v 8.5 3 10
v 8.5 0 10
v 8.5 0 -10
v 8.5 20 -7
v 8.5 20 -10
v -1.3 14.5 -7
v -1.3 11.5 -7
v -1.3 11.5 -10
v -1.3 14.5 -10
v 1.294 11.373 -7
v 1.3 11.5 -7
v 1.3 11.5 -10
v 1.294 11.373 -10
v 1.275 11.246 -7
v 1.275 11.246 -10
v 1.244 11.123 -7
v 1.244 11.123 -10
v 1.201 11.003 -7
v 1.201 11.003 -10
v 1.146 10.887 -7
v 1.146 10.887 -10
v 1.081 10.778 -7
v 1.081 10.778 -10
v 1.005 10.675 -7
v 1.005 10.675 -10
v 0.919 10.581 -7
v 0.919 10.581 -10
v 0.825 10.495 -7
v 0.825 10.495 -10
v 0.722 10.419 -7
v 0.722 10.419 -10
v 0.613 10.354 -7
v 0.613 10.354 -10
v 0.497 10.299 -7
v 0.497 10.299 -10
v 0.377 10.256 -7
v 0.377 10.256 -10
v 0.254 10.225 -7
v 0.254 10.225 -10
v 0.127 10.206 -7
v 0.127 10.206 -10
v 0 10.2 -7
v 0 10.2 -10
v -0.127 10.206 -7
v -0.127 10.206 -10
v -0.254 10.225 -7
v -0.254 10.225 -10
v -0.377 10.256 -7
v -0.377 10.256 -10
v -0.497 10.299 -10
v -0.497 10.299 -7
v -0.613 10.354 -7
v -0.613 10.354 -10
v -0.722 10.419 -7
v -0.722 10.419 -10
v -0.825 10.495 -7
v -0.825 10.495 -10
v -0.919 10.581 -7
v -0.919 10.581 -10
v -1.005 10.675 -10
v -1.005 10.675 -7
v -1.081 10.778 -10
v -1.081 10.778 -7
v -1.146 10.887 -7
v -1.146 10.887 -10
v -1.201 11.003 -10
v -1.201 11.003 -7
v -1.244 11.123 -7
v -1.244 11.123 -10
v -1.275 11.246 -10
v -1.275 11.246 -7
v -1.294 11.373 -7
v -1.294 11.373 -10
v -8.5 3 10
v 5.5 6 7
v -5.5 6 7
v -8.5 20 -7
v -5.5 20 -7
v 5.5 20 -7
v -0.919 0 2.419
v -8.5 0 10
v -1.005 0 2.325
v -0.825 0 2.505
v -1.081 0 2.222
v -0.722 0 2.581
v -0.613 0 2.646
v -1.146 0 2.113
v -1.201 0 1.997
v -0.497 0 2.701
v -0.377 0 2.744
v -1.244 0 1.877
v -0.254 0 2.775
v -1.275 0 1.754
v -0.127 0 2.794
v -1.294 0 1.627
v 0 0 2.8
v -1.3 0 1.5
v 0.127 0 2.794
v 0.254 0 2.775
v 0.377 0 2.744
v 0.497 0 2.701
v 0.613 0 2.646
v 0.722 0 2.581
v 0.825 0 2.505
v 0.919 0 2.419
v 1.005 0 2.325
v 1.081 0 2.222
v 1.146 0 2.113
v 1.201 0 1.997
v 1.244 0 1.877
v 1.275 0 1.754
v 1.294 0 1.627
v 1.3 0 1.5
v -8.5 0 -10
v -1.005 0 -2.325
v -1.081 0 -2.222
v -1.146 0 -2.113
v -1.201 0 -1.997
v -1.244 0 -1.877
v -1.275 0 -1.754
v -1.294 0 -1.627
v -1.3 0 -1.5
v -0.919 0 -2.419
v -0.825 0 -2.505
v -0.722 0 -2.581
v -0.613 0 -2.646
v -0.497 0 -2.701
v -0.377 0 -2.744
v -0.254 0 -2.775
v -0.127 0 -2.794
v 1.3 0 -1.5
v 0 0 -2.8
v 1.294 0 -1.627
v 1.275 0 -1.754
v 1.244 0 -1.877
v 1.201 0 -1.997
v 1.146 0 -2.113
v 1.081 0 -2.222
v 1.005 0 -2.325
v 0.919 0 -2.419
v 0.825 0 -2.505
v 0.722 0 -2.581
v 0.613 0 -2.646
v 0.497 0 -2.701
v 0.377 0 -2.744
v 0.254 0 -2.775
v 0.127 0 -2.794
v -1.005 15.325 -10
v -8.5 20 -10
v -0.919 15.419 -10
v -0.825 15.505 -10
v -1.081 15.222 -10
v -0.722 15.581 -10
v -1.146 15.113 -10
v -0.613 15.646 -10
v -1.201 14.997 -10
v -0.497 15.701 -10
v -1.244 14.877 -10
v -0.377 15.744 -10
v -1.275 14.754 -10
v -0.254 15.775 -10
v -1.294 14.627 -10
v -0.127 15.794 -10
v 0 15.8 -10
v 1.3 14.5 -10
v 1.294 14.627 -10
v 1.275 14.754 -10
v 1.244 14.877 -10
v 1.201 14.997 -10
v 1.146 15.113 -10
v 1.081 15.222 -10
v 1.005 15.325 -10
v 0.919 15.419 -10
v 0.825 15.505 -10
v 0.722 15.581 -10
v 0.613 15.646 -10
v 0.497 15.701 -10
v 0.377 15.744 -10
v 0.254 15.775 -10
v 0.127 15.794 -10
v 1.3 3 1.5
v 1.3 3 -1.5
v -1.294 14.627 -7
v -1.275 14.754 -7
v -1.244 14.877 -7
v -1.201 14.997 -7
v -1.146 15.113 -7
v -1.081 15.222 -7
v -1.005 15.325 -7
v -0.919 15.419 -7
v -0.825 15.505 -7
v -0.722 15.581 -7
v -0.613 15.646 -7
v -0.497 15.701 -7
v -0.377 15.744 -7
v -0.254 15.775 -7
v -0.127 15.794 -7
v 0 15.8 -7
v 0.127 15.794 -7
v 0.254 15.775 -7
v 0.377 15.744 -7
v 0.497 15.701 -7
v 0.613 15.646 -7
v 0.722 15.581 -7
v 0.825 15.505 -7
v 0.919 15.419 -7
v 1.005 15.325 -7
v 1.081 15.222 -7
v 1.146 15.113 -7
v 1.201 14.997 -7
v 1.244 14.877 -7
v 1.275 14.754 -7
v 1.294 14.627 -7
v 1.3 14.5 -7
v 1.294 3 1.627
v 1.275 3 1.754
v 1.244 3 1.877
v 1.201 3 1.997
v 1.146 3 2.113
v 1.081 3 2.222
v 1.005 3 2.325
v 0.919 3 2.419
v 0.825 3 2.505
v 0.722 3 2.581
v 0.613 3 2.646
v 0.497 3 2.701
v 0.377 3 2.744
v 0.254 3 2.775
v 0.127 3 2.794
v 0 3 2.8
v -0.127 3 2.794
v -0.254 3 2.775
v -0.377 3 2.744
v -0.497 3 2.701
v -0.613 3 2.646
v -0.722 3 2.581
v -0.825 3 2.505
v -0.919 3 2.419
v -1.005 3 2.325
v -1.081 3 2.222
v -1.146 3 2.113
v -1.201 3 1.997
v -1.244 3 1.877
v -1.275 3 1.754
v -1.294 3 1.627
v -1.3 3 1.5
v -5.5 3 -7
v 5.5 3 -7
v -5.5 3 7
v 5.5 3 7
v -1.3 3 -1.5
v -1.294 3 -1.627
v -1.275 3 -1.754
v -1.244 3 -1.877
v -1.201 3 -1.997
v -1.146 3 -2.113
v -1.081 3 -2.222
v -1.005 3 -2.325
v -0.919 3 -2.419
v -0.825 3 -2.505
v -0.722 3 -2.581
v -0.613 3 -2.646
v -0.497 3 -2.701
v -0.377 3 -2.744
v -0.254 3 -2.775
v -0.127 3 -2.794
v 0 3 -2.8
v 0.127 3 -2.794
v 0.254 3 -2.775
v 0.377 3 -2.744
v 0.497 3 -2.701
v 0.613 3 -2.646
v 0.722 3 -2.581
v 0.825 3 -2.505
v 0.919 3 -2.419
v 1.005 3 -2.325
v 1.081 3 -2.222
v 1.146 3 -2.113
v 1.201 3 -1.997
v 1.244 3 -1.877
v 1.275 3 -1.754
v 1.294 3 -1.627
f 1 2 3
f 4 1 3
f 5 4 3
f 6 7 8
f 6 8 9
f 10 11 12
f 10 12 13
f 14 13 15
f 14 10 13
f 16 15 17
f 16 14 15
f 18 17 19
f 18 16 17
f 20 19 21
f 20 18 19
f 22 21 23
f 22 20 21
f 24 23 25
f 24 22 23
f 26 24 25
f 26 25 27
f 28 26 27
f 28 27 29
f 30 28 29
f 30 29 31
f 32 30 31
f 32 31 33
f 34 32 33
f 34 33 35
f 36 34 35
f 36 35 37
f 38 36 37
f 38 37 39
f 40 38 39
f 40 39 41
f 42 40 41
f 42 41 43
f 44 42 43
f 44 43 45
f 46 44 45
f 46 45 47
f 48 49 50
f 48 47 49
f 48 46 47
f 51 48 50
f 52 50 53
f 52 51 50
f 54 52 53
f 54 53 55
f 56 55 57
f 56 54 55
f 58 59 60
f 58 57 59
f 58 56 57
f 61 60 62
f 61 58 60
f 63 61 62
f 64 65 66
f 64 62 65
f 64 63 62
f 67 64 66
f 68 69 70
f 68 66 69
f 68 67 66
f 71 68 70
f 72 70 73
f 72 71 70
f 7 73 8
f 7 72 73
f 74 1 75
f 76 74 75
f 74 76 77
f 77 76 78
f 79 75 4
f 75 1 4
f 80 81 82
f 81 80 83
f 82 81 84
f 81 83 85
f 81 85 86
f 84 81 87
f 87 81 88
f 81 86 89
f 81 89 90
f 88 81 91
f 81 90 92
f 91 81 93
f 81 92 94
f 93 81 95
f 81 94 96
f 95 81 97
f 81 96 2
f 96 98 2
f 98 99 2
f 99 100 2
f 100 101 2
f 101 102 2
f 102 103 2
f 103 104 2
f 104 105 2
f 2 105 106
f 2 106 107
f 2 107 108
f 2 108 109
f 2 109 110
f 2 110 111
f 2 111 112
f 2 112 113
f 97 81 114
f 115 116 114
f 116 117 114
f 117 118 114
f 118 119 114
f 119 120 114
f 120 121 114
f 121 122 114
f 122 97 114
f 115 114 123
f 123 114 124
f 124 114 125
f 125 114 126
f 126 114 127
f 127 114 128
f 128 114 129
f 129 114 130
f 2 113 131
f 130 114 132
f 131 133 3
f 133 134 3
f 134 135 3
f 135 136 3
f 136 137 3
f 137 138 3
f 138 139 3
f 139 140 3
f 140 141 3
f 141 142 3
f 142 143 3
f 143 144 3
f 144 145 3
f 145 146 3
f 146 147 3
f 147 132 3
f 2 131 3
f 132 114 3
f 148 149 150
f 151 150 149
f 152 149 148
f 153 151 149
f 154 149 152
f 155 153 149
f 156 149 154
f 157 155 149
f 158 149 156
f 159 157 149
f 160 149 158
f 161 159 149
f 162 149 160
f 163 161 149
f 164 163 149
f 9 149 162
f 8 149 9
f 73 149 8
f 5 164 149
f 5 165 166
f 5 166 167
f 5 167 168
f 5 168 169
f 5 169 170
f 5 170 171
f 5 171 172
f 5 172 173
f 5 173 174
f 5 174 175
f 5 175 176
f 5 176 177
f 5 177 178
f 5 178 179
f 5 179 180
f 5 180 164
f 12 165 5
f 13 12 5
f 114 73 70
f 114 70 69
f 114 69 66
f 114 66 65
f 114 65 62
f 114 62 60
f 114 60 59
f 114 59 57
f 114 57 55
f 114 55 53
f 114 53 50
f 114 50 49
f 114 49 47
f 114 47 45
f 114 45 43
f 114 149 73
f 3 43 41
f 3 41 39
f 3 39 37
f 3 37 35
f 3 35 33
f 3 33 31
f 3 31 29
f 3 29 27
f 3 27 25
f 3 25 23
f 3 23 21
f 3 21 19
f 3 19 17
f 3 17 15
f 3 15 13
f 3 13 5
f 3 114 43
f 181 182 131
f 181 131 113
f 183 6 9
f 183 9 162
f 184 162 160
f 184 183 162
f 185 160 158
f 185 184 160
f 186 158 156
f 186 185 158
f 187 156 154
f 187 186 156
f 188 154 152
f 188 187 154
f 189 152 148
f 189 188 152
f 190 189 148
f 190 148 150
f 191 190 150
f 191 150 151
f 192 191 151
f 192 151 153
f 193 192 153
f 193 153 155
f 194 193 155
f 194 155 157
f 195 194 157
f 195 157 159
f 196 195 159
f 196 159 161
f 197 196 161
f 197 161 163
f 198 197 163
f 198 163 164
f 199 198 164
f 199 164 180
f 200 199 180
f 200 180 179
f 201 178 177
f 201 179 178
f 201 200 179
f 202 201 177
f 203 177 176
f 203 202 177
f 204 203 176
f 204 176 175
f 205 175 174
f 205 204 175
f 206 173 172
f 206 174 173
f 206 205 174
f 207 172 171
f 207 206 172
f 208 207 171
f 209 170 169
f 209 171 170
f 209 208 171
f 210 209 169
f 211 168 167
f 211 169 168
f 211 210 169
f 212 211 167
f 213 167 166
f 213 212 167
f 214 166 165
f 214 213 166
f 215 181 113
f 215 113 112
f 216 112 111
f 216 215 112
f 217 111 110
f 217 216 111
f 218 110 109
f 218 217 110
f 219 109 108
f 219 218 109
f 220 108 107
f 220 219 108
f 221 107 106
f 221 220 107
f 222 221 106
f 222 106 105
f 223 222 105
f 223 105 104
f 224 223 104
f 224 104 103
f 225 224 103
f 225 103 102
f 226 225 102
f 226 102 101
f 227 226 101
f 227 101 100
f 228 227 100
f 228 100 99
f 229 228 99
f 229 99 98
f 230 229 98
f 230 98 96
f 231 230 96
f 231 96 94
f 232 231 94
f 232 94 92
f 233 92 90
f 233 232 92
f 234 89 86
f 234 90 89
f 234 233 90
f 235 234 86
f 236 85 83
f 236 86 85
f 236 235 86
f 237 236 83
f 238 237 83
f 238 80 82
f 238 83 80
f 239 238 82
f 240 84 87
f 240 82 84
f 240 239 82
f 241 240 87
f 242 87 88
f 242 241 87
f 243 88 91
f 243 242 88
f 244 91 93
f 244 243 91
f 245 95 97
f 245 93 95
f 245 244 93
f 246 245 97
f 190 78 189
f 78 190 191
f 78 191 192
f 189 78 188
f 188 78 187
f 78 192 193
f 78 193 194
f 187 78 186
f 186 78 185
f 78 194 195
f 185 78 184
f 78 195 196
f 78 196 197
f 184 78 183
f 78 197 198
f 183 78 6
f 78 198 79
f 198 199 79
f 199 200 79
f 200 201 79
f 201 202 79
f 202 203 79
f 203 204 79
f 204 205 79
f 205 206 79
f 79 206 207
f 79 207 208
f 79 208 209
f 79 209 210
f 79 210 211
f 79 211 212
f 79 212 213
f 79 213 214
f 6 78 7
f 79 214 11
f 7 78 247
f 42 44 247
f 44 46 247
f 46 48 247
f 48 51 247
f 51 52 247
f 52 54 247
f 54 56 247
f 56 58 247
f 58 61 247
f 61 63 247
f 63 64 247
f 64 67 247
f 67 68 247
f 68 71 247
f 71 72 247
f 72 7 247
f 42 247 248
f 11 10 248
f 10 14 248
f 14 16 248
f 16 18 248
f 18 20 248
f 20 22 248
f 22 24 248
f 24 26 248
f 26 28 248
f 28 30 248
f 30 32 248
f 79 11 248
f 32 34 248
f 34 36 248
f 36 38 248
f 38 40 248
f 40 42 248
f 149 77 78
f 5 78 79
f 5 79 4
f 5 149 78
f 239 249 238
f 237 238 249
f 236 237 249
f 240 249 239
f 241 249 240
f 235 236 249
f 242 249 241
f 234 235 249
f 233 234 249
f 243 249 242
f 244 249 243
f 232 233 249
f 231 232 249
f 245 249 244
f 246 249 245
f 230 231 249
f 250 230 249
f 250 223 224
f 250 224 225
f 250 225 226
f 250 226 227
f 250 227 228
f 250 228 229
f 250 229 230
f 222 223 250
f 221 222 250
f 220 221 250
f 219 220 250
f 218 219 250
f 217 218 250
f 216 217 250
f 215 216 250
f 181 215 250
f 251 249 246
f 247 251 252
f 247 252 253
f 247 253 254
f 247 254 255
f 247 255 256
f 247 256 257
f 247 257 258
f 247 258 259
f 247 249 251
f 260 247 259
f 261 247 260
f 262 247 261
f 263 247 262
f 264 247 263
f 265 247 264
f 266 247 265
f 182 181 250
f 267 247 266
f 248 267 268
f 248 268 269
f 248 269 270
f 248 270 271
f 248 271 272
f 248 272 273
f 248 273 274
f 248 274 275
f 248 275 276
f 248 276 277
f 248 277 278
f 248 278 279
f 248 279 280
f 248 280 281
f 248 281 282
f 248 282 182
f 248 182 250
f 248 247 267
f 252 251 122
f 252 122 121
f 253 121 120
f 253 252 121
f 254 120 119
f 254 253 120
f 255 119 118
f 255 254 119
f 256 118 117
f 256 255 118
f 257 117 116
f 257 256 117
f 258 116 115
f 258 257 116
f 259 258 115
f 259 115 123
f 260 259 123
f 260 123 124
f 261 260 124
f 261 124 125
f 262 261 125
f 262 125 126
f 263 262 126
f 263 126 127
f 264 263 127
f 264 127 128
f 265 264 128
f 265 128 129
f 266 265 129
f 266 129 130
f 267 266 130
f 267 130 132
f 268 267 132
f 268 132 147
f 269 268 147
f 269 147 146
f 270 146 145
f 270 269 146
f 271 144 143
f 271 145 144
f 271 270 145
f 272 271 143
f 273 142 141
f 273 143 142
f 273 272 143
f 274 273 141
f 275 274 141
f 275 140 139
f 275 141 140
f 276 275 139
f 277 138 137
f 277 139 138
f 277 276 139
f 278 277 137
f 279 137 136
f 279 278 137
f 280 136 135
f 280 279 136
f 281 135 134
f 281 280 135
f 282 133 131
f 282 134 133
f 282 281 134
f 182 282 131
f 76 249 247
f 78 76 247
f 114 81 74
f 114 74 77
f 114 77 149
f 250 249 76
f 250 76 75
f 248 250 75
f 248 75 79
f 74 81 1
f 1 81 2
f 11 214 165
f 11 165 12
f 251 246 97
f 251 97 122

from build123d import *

# Parameters (mm, degrees)
SKETCH1_W           = 17
SKETCH1_H           = 20
BOSS_EXTRUDE1_DEPTH = 20
SHELL1_T            = -3
CUT_EXTRUDE1_DEPTH  = 18
CUT_EXTRUDE2_DEPTH  = 4
CUT_EXTRUDE3_DEPTH  = 4


with BuildPart() as part:
    # Sketch1 → Boss-Extrude1 (new body)
    with BuildSketch(Plane(origin=(0, 0, 0), x_dir=(1, 0, 0), z_dir=(0, 1, 0))):
        Rectangle(SKETCH1_W, SKETCH1_H)
    extrude(amount=BOSS_EXTRUDE1_DEPTH)

    # Shell1
    shell1_openings = [part.faces().sort_by_distance(p)[0] for p in [
        (0, 20, 0),
    ]]
    offset(amount=SHELL1_T, openings=shell1_openings, kind=Kind.INTERSECTION)

    # Sketch3 → Cut-Extrude1 (cut, through all)
    with BuildSketch(Plane(origin=(8.5, 0, 0), x_dir=(0, 0, -1), z_dir=(1, 0, 0))):
        Polygon((7, 20), (-10, 20), (-10, 3), align=None)
    extrude(amount=-CUT_EXTRUDE1_DEPTH, mode=Mode.SUBTRACT)

    # Sketch4 → Cut-Extrude2 (cut, through all)
    with BuildSketch(Plane(origin=(0, 3, 0), x_dir=(1, 0, 0), z_dir=(0, 1, 0))):
        with BuildLine():
            Line((1.3, 1.5), (1.3, -1.5))
            ThreePointArc((1.3, -1.5), (0, -2.8), (-1.3, -1.5))
            Line((-1.3, -1.5), (-1.3, 1.5))
            ThreePointArc((-1.3, 1.5), (0, 2.8), (1.3, 1.5))
        make_face()
    extrude(amount=-CUT_EXTRUDE2_DEPTH, mode=Mode.SUBTRACT)

    # Sketch5 → Cut-Extrude3 (cut, through all)
    with BuildSketch(Plane.XY.offset(-7)):
        with BuildLine():
            Line((1.3, 14.5), (1.3, 11.5))
            ThreePointArc((1.3, 11.5), (0, 10.2), (-1.3, 11.5))
            Line((-1.3, 11.5), (-1.3, 14.5))
            ThreePointArc((-1.3, 14.5), (0, 15.8), (1.3, 14.5))
        make_face()
    extrude(amount=-CUT_EXTRUDE3_DEPTH, mode=Mode.SUBTRACT)


solid = part.part
